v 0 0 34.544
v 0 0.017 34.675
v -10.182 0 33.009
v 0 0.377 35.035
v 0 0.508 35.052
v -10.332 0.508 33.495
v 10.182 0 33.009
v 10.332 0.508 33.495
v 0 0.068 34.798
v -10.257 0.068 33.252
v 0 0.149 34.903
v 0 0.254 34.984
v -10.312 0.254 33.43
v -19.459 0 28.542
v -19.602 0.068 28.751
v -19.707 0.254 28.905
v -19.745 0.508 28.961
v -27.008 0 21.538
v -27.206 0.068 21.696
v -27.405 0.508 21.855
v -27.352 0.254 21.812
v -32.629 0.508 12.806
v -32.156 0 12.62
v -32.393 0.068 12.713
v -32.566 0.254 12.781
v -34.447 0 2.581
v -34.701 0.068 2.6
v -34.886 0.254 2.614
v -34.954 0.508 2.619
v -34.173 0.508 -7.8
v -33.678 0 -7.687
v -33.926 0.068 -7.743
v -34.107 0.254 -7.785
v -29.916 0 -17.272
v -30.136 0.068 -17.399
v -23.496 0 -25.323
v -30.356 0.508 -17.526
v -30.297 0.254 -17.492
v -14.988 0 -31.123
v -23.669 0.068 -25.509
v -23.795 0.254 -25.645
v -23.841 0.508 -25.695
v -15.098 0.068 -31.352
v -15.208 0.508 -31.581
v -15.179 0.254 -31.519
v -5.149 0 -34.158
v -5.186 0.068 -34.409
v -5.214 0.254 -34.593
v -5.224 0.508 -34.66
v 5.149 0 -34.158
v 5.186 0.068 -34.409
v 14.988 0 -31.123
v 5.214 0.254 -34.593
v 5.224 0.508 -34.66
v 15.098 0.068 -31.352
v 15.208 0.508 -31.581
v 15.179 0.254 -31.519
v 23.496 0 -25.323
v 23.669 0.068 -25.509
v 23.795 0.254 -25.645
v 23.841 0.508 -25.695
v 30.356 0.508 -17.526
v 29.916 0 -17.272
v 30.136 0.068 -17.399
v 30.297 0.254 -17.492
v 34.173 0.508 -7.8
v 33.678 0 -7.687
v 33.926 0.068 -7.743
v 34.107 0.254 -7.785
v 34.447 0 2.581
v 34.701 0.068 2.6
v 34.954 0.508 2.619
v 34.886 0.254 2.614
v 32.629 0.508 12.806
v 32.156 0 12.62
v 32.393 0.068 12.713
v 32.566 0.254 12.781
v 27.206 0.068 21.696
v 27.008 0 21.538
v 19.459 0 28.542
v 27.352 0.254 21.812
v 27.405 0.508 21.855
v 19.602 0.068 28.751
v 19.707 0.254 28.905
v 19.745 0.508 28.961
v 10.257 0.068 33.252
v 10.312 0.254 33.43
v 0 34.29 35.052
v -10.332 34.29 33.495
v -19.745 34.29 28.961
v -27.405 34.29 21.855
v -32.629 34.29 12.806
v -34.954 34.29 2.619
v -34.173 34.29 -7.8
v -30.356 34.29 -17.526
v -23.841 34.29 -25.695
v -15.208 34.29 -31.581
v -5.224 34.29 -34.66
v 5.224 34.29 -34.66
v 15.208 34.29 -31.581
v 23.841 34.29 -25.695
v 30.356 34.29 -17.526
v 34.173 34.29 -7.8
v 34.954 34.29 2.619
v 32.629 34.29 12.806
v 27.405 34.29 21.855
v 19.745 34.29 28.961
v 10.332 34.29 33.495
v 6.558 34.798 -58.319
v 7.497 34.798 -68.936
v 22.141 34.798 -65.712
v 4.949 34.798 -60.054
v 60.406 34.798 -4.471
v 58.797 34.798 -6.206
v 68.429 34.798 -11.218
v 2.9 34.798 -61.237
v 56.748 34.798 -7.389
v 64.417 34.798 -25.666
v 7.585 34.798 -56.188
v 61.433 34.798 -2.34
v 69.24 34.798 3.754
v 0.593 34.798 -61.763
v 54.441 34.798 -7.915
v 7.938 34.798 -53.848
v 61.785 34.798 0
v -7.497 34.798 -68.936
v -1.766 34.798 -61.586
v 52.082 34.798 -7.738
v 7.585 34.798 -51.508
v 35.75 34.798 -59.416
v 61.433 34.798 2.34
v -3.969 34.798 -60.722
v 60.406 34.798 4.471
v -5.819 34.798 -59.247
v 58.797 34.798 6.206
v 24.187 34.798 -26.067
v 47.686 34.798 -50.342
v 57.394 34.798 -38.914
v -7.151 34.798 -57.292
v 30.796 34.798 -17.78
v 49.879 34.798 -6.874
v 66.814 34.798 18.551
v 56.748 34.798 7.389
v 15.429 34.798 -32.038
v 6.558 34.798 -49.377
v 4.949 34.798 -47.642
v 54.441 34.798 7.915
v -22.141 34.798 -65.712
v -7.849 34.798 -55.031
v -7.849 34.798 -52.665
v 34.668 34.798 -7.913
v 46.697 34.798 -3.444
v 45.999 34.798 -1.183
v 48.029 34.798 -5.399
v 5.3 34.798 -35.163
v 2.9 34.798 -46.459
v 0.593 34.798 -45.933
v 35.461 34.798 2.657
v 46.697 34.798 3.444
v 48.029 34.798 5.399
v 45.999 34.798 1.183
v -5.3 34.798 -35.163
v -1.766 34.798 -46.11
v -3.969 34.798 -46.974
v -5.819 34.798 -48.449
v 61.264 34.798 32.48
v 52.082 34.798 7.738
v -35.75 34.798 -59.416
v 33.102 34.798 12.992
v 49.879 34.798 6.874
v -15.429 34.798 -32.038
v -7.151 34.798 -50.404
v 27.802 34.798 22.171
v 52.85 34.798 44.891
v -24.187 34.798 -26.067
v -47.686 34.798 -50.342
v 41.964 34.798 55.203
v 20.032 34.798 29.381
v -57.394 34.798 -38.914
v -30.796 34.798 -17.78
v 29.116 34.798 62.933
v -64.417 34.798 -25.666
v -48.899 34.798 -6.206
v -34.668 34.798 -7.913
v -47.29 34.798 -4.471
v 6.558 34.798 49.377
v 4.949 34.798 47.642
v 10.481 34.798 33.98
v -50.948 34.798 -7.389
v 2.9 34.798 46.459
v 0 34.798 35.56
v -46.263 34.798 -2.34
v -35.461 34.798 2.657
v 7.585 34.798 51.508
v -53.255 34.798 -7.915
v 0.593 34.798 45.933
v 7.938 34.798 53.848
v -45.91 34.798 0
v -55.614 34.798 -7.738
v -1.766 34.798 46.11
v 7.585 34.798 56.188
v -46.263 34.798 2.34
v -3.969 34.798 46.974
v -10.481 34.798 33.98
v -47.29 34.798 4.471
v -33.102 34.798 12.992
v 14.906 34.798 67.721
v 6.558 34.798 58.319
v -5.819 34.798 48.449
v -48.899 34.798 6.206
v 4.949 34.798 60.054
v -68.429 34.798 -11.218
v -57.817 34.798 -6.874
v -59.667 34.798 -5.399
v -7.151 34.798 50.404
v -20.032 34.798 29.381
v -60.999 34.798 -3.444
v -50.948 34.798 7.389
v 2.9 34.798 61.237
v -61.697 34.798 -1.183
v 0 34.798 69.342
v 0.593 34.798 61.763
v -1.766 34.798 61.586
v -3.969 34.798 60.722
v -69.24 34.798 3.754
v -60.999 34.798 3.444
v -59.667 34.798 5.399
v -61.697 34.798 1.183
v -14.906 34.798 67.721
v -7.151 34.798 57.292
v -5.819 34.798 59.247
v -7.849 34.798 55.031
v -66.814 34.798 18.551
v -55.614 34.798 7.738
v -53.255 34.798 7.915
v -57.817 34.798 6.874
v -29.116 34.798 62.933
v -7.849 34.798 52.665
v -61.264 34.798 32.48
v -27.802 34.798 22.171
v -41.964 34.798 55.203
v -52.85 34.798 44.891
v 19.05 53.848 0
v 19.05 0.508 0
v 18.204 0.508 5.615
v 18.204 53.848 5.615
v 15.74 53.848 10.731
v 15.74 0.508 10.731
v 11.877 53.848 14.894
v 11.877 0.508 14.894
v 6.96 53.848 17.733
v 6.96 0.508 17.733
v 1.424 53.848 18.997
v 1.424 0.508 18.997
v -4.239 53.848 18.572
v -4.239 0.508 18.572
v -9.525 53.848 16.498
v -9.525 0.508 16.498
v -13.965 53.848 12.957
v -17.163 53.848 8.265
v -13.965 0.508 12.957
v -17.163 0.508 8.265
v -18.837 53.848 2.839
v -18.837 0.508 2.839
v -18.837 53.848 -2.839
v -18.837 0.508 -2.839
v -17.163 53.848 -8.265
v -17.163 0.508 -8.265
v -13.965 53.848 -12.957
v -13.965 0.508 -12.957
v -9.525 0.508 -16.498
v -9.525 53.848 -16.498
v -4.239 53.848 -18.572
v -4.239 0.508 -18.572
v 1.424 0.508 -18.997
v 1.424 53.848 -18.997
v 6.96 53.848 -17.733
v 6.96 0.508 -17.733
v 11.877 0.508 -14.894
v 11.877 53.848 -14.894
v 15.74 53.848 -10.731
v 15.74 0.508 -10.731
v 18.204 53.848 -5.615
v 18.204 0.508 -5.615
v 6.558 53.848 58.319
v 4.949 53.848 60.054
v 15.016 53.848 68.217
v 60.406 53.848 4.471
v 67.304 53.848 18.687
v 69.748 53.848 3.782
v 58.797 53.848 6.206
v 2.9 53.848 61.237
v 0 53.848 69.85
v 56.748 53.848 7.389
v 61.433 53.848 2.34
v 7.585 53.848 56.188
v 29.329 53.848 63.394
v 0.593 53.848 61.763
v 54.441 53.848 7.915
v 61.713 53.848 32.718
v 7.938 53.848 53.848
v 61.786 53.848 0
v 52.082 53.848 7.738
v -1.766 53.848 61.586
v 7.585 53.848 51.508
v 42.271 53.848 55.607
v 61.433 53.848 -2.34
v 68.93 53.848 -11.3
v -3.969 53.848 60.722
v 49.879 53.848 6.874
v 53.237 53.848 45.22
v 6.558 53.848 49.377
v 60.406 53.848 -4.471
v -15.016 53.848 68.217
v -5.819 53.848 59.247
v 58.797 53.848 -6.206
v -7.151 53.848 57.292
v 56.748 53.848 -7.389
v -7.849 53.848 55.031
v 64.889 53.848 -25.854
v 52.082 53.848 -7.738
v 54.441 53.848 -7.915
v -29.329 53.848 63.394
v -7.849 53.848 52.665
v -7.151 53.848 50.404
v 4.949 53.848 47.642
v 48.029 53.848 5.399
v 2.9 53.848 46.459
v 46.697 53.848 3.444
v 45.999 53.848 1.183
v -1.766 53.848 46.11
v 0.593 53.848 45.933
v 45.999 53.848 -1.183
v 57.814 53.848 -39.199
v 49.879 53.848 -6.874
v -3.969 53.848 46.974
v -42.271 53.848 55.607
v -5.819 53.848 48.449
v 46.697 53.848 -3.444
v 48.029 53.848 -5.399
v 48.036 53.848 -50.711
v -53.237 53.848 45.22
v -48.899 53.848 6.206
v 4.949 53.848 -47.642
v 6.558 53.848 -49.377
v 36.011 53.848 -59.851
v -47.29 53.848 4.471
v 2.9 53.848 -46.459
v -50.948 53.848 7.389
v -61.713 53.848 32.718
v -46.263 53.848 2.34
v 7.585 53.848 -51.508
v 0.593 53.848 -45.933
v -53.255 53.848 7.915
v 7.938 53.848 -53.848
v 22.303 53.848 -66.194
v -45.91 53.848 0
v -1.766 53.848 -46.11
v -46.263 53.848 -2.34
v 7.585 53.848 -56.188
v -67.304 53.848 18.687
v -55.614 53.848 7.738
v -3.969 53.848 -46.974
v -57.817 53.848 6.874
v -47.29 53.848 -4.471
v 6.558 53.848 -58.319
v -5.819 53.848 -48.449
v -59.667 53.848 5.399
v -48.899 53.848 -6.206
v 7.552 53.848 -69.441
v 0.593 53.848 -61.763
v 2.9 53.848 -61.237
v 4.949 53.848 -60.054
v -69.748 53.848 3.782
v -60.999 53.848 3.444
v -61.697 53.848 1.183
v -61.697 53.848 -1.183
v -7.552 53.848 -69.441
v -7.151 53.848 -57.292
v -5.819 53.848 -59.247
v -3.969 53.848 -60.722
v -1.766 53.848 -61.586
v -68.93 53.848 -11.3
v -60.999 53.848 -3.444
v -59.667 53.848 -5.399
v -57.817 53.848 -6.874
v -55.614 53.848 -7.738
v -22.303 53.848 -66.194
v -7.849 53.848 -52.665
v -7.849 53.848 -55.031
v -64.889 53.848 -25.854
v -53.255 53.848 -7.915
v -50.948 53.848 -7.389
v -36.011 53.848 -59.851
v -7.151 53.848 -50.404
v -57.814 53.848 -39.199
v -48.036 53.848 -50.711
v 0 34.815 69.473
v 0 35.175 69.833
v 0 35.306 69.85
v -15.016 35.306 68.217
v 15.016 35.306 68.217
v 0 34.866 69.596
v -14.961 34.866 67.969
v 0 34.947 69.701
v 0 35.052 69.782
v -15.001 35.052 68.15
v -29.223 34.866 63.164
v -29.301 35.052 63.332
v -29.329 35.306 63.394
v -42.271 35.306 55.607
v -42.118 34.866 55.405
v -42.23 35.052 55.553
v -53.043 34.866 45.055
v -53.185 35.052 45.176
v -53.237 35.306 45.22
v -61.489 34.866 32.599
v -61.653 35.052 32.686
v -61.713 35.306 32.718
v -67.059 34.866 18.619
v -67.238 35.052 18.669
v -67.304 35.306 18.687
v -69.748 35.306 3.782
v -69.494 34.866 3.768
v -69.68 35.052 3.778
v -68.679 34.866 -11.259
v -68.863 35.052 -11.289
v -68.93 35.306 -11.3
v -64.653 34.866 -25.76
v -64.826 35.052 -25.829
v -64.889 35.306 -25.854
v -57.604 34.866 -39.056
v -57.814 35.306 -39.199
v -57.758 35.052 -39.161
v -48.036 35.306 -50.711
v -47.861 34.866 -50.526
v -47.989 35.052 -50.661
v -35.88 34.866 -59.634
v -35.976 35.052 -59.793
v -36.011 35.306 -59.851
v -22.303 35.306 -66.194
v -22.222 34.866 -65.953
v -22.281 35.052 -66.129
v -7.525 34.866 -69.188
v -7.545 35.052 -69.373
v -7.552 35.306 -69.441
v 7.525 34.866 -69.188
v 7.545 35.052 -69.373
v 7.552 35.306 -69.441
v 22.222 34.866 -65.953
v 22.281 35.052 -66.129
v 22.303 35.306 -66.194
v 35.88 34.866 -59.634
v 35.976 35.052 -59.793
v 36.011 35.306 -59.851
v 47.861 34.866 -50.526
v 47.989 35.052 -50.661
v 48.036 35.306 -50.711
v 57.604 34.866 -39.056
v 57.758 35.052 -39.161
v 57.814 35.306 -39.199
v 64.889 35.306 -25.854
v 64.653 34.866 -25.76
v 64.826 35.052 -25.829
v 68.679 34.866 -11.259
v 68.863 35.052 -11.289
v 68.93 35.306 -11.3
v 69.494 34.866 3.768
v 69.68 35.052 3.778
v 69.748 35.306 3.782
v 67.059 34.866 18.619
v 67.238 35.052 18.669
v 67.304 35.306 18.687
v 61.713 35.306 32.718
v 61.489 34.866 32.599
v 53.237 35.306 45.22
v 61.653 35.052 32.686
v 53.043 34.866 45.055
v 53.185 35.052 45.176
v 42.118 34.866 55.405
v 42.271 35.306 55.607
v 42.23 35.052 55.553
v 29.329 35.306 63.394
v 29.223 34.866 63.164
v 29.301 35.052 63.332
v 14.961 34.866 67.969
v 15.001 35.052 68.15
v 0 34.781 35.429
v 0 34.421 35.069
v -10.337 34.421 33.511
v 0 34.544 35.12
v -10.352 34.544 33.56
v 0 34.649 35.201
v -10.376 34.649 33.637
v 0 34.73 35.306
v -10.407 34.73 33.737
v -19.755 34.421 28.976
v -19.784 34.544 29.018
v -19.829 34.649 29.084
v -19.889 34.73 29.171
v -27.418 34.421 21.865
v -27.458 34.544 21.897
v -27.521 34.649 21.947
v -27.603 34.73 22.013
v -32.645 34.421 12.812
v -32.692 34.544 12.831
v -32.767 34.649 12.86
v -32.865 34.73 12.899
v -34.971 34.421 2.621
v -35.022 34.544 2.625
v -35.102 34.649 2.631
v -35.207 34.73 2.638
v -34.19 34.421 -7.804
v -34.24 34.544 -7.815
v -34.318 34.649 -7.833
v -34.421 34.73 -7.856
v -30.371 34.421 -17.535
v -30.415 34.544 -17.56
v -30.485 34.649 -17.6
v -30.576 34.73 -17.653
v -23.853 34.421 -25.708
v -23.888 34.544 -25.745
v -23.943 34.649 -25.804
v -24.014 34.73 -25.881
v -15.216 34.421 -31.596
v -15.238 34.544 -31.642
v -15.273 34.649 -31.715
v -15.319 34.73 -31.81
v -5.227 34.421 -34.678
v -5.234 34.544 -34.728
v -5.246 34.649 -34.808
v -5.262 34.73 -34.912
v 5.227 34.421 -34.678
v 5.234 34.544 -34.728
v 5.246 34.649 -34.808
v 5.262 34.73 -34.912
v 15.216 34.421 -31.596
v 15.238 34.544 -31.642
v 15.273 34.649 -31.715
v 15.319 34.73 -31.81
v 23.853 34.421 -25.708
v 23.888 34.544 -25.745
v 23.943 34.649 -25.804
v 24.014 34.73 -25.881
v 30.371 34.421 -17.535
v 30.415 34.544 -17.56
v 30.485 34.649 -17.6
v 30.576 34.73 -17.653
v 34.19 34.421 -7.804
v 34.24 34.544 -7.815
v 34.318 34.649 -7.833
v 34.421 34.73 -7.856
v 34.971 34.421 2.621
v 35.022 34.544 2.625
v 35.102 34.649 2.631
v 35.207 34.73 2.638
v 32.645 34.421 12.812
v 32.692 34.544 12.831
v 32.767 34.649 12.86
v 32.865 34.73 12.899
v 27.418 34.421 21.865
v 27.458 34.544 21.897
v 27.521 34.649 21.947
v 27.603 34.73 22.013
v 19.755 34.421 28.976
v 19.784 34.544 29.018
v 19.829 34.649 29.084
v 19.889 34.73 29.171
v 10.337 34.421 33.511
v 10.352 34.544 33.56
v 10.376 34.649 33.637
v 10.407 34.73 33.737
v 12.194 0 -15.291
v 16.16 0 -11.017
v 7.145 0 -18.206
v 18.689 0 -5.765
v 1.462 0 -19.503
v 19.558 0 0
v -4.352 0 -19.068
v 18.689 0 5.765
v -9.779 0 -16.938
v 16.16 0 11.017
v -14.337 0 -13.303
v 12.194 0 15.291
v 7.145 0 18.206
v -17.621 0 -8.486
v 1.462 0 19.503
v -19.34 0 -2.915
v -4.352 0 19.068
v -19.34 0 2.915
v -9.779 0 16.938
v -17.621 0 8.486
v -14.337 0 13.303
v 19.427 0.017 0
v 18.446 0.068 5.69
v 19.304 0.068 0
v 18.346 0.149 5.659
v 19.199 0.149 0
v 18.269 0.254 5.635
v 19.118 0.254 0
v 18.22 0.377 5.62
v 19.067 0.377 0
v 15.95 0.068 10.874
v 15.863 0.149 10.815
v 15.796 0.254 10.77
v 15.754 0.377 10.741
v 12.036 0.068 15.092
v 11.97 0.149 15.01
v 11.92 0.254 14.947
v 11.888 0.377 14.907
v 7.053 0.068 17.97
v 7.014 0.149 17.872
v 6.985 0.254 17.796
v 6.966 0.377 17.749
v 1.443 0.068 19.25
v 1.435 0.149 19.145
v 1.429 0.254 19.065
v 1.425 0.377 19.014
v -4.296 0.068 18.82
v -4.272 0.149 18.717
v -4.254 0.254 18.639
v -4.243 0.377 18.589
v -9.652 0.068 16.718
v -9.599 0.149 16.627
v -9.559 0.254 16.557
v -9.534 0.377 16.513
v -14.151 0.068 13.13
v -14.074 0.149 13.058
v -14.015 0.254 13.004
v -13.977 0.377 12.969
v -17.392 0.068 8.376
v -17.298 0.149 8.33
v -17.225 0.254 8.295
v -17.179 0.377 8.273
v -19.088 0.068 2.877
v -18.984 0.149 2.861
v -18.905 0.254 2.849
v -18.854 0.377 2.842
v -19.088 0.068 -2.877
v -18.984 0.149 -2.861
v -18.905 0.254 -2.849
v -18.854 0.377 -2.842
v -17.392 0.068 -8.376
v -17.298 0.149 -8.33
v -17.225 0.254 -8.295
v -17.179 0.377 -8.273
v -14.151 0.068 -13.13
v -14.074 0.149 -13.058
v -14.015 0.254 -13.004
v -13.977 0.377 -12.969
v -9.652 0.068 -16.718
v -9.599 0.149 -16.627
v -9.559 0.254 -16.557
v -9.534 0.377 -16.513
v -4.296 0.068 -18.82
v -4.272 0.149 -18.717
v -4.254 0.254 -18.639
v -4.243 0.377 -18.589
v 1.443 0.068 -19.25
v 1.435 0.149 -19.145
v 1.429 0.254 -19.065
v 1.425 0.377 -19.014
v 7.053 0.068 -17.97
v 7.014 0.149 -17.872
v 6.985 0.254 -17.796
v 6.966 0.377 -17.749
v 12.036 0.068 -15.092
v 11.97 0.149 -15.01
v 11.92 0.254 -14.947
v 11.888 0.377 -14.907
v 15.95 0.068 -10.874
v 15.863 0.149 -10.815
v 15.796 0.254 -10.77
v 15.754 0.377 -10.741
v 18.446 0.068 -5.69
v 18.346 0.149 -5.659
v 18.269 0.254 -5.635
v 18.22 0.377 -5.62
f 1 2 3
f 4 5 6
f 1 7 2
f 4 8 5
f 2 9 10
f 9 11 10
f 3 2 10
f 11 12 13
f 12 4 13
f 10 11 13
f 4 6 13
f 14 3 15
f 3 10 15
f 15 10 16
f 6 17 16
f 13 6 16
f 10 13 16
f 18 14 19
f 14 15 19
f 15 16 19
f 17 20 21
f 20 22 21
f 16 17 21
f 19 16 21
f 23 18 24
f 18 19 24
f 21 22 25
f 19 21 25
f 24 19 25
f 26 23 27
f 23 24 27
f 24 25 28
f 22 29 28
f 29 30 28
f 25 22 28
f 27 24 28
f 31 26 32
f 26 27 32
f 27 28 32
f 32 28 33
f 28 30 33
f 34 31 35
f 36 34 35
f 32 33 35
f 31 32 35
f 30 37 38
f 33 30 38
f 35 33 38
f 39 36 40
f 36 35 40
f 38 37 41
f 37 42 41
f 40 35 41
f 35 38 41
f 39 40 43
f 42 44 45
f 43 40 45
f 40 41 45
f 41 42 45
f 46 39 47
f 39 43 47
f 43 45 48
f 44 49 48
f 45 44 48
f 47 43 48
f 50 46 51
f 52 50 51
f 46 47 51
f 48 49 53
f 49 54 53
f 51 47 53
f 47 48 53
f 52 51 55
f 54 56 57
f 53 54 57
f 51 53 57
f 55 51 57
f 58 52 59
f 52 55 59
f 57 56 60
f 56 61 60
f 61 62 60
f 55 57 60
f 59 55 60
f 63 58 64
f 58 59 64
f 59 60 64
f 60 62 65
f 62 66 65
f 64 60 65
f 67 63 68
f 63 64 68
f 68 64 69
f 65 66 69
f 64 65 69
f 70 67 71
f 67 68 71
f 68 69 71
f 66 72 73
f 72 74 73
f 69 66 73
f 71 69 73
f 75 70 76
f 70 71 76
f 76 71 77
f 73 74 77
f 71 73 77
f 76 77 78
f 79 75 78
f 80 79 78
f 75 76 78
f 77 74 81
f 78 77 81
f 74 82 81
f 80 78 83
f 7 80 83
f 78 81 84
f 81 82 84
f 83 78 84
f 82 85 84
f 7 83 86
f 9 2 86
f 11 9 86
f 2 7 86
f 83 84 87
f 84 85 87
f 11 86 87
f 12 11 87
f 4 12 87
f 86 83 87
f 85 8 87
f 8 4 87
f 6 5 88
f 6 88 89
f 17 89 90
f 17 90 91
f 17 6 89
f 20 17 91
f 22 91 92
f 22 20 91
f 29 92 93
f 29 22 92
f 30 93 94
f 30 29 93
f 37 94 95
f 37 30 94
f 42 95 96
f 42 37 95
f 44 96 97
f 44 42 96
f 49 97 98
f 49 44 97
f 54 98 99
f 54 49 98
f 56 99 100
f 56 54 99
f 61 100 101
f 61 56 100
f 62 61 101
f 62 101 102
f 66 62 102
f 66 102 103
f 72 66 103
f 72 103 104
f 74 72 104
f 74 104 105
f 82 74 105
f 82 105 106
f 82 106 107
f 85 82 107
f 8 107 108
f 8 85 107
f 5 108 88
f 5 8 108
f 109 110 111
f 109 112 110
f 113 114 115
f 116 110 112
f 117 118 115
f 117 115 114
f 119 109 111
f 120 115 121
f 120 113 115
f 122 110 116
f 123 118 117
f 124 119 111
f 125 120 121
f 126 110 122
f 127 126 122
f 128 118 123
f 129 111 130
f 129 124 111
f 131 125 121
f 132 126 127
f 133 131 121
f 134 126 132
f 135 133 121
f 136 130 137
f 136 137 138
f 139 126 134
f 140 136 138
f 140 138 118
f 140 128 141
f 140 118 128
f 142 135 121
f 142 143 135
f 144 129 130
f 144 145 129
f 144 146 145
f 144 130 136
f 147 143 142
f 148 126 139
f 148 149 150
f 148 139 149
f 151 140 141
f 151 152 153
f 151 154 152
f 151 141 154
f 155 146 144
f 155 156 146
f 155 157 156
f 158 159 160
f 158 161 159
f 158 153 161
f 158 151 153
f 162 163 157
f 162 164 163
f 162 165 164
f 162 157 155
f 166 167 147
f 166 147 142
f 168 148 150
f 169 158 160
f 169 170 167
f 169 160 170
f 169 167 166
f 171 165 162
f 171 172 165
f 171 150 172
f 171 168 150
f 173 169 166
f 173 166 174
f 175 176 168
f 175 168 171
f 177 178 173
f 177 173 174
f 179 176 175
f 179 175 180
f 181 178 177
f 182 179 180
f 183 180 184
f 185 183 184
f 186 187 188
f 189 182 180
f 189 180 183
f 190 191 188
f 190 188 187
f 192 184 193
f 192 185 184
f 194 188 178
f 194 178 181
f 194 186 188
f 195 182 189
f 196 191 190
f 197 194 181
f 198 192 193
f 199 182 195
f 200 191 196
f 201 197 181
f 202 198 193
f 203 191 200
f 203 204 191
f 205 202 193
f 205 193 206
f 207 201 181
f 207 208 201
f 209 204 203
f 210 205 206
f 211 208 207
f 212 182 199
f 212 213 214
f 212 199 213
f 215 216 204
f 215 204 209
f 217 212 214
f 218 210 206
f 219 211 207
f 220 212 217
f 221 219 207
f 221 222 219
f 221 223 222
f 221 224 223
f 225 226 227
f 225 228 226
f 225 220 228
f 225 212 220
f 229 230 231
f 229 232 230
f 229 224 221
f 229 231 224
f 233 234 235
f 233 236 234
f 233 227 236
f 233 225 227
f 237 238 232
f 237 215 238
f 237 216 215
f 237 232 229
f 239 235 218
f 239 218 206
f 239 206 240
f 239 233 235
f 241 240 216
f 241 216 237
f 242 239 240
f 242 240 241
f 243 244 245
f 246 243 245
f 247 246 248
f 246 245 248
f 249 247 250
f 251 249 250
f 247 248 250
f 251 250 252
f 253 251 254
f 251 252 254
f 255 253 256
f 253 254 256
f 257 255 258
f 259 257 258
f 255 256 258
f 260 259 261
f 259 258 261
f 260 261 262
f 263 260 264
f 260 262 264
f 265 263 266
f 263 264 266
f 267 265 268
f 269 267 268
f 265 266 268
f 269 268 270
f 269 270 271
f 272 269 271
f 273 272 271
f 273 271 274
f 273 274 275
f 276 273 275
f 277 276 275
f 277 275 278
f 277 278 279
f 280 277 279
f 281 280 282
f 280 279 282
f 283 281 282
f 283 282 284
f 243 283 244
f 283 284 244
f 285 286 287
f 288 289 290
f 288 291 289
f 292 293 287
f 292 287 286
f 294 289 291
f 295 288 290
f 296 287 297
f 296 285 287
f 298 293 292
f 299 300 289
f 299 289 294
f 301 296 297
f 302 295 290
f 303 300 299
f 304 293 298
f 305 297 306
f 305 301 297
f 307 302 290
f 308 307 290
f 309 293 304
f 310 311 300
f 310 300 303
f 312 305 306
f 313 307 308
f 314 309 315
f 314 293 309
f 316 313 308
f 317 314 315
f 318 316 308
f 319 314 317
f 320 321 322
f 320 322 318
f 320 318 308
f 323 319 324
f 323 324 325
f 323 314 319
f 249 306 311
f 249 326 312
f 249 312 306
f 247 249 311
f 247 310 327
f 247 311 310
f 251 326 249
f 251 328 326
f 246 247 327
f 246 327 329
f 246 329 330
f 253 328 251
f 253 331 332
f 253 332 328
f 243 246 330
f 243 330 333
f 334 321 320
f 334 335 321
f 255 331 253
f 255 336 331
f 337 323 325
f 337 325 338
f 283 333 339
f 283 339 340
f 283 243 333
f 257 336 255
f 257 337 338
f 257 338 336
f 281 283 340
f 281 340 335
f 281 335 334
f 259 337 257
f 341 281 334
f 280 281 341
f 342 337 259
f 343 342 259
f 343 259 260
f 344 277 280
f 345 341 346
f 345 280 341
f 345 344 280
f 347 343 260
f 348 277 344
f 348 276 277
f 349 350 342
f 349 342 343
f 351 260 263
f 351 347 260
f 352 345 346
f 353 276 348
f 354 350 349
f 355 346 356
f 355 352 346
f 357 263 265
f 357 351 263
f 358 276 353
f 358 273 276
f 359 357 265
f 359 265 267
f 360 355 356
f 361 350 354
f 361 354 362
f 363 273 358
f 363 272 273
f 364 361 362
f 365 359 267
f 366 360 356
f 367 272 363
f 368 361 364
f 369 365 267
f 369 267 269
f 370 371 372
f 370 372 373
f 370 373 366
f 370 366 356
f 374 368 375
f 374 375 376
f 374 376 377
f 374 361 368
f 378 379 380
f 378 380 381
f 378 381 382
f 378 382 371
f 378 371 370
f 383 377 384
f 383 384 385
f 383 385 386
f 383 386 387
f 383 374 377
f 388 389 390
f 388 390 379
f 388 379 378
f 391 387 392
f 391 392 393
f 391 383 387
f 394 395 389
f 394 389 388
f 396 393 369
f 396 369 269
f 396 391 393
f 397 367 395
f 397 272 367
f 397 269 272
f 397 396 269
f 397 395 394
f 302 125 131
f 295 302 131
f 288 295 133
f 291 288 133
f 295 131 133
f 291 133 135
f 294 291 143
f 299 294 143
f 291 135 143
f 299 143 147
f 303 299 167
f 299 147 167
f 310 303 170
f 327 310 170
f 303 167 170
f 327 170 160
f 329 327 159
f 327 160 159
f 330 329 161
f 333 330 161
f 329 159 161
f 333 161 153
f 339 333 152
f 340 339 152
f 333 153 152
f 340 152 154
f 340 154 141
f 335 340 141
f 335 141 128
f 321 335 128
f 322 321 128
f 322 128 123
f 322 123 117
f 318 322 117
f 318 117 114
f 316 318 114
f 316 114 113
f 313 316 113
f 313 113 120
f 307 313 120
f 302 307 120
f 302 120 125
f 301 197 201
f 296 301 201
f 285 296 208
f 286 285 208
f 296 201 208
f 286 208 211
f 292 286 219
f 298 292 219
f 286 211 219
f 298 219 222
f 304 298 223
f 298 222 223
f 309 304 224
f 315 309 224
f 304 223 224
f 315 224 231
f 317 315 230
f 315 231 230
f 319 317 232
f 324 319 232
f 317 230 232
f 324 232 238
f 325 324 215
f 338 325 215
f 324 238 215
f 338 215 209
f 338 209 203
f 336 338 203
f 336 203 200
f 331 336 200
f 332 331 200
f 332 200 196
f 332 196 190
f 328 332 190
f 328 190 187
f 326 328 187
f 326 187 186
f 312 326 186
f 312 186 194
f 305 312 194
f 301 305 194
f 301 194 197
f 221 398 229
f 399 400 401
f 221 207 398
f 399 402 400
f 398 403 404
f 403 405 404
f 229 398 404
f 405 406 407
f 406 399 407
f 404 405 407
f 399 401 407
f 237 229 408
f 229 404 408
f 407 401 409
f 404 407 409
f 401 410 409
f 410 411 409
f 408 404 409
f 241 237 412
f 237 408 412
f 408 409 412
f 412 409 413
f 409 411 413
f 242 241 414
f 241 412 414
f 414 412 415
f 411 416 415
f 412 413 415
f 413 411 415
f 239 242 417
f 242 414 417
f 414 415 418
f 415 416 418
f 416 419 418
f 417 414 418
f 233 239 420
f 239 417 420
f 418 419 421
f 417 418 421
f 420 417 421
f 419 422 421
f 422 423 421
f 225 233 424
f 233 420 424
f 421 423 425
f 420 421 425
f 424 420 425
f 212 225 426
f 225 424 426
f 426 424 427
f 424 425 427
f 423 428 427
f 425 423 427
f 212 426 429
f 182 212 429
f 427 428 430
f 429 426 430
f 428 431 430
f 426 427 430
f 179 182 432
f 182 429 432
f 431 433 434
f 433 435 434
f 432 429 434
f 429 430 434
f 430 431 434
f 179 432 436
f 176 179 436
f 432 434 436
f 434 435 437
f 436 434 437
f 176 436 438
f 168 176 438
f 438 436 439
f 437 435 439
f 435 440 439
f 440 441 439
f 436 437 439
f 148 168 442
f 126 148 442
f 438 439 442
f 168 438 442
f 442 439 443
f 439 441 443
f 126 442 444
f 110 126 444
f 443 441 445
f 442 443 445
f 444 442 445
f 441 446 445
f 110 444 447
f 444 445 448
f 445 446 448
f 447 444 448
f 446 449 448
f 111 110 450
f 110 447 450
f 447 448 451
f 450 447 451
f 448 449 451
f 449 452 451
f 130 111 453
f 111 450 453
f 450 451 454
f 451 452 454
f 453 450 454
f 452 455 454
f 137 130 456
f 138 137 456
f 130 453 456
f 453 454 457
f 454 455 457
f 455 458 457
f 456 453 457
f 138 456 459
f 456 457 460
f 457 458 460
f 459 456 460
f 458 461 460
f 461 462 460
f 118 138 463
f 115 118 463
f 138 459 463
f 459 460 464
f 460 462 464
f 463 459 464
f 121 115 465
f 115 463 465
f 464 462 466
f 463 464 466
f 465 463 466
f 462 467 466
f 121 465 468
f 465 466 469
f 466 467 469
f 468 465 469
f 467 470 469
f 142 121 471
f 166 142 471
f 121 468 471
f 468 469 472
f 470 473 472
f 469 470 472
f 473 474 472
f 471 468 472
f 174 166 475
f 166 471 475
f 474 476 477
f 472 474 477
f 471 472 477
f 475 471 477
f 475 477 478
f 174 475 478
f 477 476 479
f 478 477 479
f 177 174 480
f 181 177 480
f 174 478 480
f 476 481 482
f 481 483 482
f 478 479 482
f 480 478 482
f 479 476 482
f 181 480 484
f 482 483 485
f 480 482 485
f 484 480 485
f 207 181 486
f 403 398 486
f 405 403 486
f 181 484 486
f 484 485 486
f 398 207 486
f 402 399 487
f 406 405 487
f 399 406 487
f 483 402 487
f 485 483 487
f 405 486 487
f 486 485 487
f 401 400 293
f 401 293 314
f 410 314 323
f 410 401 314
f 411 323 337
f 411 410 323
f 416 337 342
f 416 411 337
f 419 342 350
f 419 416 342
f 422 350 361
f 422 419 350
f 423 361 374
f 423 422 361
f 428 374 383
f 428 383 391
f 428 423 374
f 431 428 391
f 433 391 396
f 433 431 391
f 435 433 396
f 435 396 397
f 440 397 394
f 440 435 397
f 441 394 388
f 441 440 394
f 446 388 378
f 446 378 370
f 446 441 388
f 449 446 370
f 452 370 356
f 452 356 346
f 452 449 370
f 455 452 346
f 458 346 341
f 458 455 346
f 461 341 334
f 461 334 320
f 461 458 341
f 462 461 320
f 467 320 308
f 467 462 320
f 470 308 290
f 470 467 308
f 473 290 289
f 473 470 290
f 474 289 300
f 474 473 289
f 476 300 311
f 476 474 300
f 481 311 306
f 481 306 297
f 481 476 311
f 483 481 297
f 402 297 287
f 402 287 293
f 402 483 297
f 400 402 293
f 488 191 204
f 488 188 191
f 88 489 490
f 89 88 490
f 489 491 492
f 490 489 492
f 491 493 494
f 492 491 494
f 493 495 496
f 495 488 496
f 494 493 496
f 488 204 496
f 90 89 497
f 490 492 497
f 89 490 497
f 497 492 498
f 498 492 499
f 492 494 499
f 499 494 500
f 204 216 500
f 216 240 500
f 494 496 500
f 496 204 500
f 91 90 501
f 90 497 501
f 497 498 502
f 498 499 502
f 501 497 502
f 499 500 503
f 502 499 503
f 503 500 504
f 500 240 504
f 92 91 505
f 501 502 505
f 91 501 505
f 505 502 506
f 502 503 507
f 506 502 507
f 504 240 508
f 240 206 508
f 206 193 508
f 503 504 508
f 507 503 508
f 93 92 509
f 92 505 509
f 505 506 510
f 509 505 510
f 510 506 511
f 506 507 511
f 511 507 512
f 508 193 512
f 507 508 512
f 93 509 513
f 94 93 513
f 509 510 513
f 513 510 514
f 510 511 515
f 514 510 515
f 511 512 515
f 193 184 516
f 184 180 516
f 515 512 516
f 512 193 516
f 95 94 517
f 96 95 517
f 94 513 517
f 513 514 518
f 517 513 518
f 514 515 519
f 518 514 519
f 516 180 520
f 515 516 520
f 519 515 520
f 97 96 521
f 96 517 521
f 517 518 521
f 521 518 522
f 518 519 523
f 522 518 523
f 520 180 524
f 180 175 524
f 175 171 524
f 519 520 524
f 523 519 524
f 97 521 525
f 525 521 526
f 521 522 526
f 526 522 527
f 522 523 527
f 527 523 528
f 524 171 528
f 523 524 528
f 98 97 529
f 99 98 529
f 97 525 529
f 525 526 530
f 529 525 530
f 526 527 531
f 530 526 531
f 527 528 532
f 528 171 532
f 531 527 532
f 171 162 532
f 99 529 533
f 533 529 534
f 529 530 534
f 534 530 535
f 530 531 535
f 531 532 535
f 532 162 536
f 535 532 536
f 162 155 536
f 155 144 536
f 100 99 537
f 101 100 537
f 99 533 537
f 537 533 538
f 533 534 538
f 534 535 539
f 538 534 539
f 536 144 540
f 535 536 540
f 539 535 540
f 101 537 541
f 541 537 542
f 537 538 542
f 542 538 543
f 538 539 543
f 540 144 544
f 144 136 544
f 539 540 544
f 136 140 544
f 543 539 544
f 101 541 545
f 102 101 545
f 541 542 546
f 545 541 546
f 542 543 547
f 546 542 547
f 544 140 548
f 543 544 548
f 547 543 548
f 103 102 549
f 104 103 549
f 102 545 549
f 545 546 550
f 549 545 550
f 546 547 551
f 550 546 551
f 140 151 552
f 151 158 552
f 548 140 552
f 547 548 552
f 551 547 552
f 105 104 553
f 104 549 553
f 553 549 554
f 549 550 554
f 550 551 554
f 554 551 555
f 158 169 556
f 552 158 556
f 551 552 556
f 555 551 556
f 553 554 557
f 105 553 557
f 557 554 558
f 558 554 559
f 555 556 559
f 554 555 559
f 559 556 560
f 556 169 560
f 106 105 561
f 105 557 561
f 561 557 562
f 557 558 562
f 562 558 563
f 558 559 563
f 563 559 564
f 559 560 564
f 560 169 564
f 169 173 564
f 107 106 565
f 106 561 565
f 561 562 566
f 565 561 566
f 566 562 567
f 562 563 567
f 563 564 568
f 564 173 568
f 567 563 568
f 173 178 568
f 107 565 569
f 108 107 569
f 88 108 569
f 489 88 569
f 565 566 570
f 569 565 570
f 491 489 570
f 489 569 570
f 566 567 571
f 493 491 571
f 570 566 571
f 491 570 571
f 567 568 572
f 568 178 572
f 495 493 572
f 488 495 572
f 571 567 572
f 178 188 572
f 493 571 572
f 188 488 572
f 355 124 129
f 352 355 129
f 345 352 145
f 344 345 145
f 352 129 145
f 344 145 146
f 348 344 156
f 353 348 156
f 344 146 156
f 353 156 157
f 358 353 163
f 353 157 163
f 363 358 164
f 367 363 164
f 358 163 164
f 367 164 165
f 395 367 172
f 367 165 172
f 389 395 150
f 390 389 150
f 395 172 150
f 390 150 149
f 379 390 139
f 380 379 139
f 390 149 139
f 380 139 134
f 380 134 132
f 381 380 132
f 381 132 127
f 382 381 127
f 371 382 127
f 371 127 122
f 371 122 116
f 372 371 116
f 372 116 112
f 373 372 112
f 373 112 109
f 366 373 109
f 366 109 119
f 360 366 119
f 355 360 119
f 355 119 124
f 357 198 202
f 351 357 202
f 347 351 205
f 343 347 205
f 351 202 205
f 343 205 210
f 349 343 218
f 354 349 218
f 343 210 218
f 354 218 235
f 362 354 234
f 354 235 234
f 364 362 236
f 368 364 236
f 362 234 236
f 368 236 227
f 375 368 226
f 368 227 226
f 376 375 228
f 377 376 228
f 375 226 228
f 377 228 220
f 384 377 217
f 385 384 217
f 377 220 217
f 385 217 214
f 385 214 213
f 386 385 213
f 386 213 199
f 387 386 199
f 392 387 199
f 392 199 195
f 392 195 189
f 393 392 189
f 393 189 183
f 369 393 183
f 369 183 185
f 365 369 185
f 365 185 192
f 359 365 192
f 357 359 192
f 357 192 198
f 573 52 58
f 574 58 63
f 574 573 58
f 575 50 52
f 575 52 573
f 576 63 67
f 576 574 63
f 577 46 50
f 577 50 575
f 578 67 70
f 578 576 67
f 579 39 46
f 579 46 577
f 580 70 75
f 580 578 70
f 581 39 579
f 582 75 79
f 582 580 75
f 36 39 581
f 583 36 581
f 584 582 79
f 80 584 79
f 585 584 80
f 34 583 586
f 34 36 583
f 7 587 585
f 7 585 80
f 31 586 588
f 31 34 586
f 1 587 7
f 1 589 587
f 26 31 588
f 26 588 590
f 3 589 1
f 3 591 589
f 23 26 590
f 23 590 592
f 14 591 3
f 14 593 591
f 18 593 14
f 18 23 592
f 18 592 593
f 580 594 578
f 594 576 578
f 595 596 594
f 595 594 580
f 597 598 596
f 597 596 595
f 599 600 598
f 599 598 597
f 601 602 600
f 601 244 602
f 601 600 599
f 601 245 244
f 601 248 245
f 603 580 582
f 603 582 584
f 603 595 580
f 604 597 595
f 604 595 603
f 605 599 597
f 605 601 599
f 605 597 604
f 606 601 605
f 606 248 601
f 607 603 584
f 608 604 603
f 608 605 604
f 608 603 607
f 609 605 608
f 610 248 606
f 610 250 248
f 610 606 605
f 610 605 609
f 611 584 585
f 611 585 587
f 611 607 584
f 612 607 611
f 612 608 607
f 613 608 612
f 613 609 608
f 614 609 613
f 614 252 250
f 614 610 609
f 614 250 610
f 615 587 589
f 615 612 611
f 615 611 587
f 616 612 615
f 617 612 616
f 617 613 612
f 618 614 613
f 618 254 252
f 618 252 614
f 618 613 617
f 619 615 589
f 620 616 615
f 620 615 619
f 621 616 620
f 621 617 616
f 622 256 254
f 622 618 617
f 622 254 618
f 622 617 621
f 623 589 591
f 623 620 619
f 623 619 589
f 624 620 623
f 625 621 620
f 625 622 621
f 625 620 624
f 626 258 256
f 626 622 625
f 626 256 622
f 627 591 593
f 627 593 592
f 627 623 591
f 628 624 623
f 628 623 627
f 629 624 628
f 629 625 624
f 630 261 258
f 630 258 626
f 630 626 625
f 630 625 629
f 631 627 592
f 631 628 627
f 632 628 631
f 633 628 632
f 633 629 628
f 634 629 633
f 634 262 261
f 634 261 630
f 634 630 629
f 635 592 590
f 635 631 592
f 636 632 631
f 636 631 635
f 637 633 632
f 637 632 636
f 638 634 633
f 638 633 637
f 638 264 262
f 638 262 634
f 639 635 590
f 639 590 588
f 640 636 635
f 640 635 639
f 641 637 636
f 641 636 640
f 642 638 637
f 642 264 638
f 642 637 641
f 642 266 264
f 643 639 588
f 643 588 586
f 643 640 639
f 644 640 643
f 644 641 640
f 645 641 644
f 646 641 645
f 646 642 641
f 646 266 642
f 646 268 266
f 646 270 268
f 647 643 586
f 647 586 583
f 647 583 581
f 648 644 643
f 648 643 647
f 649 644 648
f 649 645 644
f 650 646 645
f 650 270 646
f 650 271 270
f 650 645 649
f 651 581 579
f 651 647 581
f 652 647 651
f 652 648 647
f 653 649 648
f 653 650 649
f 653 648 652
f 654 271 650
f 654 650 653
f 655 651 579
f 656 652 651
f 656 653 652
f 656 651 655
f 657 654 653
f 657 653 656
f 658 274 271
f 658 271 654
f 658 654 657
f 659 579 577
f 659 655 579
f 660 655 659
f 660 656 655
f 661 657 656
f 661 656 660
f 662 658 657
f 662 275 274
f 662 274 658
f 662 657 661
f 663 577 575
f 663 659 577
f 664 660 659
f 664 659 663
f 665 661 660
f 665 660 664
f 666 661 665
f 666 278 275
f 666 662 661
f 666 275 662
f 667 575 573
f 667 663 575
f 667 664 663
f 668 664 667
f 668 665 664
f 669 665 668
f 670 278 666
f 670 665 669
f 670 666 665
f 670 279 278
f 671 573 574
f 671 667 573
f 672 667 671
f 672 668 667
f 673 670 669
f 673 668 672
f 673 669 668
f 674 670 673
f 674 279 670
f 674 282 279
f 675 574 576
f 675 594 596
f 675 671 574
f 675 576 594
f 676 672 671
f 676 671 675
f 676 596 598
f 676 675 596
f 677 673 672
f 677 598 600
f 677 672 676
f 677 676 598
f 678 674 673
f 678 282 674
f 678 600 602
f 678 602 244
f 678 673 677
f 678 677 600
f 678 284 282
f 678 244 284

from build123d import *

# Parameters (mm, degrees)
F2_R     = 19.05
F3_DEPTH = 63.5
F4_R     = 7.9375
F5_DEPTH = 127
F6_DEPTH = 25.4
F7_R     = 0.508
F8_R     = 0.508


with BuildPart() as f1:
    # F0 (on Right) → F1 (revolve)
    with BuildSketch(Plane.YZ):
        Polygon((0, 35.052), (0, 0), (53.848, 0), (53.848, 69.85), (34.798, 69.85), (34.798, 35.052), align=None)
    revolve(axis=Axis((0, 26.924, 0), (0, -1, 0)))

    # F2 (on face) → F3 (cut, symmetric)
    with BuildSketch(Plane.XZ.offset(-34.798)):
        Circle(F2_R)
    extrude(amount=F3_DEPTH, both=True, mode=Mode.SUBTRACT)

    # F4 (on face) → F5 (cut)
    with BuildSketch(Plane.XZ.offset(-34.798)):
        with Locations((0, 53.848)):
            Circle(F4_R)
        with Locations((-53.848, 0)):
            Circle(F4_R)
        with Locations((0, -53.848)):
            Circle(F4_R)
        with Locations((53.848, 0)):
            Circle(F4_R)
    extrude(amount=-F5_DEPTH, mode=Mode.SUBTRACT)

    # F4 (on face) → F6 (cut)
    with BuildSketch(Plane.XZ.offset(-34.798)):
        with Locations((0, 53.848)):
            Circle(F4_R)
        with Locations((-53.848, 0)):
            Circle(F4_R)
        with Locations((0, -53.848)):
            Circle(F4_R)
        with Locations((53.848, 0)):
            Circle(F4_R)
    extrude(amount=-F6_DEPTH, mode=Mode.SUBTRACT)

    # F7
    f7_edges = [f1.edges().sort_by_distance(p)[0] for p in [
        (-19.05, 0, 0),
    ]]
    fillet(f7_edges, radius=F7_R)

    # F8
    f8_edges = [f1.edges().sort_by_distance(p)[0] for p in [
        (0, 0, -35.052),
        (0, 34.798, -35.052),
        (0, 34.798, -69.85),
    ]]
    fillet(f8_edges, radius=F8_R)


solid = f1.part
